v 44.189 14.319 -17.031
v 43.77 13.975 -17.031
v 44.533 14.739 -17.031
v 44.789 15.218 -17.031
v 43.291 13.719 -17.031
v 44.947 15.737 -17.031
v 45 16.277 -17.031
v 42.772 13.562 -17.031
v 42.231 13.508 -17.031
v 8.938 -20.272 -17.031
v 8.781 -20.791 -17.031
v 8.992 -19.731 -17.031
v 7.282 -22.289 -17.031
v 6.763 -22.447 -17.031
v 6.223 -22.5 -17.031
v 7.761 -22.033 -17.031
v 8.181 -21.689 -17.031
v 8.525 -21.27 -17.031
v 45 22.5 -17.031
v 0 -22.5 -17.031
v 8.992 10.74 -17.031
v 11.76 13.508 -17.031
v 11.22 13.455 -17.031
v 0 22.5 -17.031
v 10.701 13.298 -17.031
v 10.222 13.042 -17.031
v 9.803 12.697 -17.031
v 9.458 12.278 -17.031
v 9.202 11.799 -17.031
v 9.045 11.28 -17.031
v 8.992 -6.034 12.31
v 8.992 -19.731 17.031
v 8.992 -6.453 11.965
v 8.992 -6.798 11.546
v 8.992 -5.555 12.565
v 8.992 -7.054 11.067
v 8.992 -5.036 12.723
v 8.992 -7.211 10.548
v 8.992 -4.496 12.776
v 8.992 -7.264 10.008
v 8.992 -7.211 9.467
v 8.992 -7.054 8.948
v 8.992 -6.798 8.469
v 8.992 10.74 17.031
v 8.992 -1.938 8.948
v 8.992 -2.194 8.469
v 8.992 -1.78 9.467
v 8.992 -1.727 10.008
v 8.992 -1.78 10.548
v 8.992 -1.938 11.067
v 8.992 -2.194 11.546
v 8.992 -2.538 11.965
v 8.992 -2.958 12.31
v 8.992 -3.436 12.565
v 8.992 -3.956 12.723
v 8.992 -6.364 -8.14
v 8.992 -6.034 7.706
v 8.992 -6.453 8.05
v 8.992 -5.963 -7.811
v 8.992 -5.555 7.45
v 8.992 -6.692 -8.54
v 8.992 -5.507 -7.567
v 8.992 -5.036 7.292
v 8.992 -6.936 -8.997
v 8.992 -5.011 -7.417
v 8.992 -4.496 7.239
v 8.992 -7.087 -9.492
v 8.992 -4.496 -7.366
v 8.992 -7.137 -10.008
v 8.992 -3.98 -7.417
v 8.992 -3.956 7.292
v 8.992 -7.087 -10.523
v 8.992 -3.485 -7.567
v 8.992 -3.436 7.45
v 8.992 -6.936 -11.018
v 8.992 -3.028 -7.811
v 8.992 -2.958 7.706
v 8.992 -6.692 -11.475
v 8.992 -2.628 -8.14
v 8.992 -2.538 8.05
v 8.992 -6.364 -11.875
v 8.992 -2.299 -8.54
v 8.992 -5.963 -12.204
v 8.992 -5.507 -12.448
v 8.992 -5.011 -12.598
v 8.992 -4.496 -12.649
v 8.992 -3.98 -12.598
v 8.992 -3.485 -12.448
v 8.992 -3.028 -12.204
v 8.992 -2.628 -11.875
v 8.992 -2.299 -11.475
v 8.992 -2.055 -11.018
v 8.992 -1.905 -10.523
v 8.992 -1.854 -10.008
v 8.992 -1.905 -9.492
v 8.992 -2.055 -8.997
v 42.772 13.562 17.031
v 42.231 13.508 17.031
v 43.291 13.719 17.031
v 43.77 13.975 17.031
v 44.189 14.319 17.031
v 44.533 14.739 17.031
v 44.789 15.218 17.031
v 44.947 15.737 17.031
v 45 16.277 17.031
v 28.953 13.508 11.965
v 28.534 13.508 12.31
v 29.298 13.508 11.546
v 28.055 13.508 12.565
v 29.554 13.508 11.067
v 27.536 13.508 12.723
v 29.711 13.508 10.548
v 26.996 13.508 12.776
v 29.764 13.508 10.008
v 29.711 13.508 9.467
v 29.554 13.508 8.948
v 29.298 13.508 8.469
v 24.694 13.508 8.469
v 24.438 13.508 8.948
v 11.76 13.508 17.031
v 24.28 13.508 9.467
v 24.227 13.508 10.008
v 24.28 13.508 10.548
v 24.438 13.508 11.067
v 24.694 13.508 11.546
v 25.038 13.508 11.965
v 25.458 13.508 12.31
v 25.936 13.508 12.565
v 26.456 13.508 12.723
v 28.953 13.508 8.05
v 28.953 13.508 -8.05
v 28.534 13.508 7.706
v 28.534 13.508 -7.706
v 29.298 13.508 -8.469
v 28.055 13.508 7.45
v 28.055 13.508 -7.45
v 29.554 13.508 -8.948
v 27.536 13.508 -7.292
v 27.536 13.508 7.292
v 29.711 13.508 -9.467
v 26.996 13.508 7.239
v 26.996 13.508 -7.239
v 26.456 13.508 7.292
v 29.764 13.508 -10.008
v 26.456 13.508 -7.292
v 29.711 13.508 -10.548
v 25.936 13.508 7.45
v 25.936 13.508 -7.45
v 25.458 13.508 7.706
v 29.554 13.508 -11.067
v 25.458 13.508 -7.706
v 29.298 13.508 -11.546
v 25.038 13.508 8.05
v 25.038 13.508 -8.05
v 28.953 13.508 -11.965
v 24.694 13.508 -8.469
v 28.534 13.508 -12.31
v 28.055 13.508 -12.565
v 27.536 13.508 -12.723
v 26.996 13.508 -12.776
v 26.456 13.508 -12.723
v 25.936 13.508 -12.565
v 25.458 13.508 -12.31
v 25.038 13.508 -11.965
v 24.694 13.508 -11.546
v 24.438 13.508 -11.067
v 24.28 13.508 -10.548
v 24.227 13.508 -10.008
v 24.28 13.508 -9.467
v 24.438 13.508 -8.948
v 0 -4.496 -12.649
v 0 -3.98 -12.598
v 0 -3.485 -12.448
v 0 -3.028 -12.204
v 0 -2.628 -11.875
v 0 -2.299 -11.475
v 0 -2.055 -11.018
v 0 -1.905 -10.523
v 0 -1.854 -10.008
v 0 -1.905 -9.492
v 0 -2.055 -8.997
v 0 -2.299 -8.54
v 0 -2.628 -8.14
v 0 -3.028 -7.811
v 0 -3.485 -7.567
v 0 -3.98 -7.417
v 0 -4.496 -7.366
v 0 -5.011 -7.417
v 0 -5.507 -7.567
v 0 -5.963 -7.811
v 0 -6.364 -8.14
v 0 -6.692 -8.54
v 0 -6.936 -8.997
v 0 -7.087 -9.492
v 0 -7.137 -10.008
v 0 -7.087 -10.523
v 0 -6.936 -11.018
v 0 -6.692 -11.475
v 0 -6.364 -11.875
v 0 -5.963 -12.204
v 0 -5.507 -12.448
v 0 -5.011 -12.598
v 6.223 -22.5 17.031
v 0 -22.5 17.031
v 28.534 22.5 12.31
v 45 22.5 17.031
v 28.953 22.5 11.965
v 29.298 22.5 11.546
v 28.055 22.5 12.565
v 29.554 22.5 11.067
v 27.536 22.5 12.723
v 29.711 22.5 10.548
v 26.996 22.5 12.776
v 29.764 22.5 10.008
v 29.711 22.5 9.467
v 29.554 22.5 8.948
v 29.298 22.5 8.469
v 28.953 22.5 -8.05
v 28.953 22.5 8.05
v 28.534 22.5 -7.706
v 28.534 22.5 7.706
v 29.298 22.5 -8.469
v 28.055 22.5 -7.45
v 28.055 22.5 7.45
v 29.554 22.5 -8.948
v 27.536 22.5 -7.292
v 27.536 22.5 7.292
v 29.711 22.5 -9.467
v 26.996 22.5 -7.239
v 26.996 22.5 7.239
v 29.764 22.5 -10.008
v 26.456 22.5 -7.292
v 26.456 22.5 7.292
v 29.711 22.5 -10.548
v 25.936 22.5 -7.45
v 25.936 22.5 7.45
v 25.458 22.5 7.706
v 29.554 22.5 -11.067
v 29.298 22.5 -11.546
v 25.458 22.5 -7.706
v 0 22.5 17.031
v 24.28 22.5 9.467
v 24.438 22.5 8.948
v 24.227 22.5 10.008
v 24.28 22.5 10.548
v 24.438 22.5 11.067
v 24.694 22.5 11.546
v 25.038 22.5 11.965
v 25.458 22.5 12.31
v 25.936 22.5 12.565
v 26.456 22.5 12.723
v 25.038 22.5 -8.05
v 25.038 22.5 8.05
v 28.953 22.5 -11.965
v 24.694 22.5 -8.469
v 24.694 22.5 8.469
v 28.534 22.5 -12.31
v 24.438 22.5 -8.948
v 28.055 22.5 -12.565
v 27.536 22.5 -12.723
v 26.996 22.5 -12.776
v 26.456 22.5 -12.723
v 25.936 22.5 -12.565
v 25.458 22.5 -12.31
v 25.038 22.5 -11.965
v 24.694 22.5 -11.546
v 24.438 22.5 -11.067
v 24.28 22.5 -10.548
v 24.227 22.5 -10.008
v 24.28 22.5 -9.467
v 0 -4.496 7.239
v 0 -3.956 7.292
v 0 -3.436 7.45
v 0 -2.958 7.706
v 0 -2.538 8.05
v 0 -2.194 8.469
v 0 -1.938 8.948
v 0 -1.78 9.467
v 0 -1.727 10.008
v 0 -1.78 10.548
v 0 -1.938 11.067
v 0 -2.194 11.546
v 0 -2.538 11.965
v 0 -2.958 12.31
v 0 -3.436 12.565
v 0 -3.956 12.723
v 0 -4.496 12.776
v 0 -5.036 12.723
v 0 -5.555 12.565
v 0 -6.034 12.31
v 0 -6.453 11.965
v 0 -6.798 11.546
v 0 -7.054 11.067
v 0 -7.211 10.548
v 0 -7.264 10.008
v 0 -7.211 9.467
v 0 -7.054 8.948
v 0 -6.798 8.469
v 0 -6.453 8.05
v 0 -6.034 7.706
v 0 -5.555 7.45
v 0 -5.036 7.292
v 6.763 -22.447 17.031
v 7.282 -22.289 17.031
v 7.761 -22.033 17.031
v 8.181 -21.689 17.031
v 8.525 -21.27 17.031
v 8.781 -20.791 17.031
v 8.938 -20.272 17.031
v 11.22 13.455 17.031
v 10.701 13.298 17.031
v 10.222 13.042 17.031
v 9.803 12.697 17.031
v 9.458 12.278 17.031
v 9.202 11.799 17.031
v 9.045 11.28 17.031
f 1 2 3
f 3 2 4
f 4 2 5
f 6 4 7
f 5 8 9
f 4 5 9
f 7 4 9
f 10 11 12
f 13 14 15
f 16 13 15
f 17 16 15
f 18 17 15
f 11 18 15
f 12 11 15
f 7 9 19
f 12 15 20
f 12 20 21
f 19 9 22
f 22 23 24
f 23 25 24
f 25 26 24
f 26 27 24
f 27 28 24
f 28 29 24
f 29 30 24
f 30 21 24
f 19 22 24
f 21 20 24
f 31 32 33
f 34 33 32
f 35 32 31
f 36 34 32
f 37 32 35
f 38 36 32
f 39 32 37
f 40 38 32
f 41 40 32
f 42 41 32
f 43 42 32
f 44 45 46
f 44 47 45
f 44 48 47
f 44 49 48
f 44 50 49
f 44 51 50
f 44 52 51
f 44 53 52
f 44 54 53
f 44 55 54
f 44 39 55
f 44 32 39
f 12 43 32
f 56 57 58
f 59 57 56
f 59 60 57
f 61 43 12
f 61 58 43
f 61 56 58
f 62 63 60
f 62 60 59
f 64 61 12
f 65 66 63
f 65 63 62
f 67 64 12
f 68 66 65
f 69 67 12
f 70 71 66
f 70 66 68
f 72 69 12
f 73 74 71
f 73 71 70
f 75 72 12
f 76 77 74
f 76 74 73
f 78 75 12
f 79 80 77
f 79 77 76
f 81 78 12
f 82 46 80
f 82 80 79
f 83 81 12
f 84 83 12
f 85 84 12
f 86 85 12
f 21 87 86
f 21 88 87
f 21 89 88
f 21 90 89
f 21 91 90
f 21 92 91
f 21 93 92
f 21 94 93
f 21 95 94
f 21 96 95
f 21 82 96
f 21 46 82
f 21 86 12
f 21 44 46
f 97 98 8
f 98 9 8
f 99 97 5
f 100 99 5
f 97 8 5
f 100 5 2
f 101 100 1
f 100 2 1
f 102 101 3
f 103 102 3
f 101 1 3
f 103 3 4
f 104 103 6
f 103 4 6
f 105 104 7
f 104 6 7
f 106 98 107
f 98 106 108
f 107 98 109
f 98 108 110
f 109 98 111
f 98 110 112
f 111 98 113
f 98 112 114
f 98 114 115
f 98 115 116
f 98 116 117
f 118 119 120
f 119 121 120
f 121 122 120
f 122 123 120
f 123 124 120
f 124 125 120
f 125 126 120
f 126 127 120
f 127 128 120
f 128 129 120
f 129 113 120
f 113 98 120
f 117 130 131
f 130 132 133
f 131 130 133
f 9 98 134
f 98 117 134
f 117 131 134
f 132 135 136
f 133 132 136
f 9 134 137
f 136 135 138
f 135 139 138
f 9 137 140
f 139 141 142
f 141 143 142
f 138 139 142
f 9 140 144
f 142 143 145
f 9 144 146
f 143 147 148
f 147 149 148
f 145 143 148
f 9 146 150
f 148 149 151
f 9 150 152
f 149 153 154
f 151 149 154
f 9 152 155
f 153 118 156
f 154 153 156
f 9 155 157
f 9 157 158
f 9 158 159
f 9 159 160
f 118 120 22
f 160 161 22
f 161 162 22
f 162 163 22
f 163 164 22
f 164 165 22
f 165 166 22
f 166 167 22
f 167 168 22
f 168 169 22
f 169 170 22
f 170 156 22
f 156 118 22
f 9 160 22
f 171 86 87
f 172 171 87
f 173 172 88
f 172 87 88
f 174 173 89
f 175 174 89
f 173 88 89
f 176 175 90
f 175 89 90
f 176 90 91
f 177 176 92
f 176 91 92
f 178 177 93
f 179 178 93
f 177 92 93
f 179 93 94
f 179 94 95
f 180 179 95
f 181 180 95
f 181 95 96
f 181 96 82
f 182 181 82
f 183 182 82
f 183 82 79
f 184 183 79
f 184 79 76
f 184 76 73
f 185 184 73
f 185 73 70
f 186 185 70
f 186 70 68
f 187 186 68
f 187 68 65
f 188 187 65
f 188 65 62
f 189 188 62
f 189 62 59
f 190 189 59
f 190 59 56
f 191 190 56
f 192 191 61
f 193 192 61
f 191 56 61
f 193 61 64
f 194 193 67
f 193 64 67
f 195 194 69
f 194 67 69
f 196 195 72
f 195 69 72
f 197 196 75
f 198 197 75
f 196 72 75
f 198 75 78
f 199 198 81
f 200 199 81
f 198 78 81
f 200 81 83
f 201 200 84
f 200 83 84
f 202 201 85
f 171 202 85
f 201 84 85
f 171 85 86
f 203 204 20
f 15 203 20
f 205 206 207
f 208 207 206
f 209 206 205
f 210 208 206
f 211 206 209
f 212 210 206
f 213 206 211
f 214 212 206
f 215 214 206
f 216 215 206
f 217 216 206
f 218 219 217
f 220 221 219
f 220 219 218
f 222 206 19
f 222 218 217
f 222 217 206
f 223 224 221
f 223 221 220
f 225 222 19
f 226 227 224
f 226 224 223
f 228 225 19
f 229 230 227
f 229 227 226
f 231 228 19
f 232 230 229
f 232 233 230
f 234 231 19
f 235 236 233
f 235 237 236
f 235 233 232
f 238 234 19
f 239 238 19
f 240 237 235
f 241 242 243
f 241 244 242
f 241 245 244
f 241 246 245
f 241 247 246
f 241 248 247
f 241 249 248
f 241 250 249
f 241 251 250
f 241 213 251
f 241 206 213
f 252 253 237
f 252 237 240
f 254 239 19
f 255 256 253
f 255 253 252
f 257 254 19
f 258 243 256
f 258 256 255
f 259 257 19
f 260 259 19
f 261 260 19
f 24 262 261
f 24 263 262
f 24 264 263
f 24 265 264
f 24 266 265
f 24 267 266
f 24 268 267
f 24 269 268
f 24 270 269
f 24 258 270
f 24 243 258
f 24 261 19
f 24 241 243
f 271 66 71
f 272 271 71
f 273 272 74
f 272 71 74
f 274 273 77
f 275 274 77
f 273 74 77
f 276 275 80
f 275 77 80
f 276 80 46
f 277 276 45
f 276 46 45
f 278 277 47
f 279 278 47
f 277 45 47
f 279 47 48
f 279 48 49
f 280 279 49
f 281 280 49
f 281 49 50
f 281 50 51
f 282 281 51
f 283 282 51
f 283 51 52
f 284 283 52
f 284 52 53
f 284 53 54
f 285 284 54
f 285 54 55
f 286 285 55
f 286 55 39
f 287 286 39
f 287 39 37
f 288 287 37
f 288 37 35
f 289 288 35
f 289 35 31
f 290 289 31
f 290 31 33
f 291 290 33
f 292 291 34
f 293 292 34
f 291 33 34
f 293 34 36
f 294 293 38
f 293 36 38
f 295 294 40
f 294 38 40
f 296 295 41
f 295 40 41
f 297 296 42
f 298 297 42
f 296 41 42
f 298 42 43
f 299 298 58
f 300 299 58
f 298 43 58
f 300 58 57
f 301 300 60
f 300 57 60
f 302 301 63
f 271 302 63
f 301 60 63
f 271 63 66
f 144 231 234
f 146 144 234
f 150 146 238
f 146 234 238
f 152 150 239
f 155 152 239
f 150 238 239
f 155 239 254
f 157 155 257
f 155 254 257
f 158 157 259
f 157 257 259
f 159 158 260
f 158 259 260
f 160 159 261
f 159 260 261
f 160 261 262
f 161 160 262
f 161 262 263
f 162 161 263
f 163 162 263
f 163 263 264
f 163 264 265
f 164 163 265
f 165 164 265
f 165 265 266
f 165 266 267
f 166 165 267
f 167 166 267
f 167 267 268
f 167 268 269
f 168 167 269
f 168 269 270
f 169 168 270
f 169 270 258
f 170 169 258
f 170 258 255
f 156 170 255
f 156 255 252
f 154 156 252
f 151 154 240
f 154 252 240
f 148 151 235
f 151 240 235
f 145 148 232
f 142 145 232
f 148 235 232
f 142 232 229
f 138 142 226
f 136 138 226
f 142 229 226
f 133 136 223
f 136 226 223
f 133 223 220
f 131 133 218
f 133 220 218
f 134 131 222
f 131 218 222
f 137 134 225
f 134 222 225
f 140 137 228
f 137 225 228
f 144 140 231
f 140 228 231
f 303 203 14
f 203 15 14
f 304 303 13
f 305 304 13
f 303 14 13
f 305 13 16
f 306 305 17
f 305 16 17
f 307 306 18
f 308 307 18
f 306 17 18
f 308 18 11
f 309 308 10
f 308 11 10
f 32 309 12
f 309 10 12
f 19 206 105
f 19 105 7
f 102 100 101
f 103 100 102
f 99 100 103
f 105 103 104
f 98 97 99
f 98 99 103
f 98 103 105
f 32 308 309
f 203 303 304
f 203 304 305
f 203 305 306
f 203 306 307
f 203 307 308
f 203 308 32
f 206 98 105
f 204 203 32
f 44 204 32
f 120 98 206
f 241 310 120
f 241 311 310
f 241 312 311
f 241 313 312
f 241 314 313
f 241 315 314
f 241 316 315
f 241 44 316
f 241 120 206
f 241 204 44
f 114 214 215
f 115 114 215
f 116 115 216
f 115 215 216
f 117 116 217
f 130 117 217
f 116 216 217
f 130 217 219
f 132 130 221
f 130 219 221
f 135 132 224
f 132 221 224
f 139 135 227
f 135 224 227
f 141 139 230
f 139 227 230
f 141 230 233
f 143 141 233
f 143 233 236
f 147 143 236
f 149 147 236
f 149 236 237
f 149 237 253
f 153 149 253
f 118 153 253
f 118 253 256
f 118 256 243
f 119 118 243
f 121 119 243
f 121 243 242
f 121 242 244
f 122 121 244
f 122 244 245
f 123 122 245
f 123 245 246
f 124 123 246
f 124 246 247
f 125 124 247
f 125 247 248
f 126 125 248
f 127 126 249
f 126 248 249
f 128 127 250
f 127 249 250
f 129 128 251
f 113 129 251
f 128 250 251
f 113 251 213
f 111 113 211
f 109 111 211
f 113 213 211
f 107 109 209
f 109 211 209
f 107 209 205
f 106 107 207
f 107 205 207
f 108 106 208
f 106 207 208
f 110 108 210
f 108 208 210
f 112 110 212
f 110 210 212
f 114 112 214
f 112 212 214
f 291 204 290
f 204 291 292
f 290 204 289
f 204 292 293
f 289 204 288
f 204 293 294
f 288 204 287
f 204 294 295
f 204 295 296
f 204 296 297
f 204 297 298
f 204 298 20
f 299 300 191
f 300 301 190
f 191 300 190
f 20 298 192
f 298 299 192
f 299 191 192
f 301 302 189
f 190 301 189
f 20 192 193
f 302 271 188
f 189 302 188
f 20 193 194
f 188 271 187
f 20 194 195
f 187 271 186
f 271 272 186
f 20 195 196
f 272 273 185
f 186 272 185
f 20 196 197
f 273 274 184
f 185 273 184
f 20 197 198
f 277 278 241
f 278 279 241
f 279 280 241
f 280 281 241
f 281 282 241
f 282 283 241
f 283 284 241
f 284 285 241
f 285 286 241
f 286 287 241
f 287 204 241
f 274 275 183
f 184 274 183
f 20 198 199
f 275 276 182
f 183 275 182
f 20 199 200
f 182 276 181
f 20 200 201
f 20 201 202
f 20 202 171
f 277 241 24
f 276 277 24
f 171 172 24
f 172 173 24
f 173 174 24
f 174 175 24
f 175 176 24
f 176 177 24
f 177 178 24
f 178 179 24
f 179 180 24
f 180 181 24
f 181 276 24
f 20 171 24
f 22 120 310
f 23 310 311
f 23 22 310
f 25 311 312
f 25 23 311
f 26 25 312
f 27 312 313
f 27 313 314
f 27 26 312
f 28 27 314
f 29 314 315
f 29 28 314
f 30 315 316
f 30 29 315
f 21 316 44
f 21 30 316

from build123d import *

# Parameters (mm, degrees)
SKETCH1_W           = 34.0614
SKETCH1_H           = 45
BOSS_EXTRUDE1_DEPTH = 8.9916
SKETCH2_W           = 34.0614
SKETCH2_H           = 8.9916
BOSS_EXTRUDE2_DEPTH = 36.0084
CUT_EXTRUDE2_REACH  = 10.992
SKETCH5_R           = 2.7686
SKETCH5_R_2         = 2.6416
CUT_EXTRUDE3_REACH  = 47
SKETCH6_R           = 2.7686
FILLET1_R           = 2.7686


with BuildPart() as part:
    # Sketch1 → Boss-Extrude1 (new body)
    with BuildSketch(Plane(origin=(0, 0, 0), x_dir=(0, 0, -1), z_dir=(1, 0, 0))):
        Rectangle(SKETCH1_W, SKETCH1_H)
    extrude(amount=BOSS_EXTRUDE1_DEPTH)

    # Sketch2 → Boss-Extrude2 (add)
    with BuildSketch(Plane(origin=(8.9916, 0, 0), x_dir=(0, 0, -1), z_dir=(1, 0, 0))):
        with Locations((0, 18.0042)):
            Rectangle(SKETCH2_W, SKETCH2_H)
    extrude(amount=BOSS_EXTRUDE2_DEPTH)

    # Sketch5 → Cut-Extrude2 (cut, up to next)
    with BuildSketch(Plane(origin=(8.9916, 0, 0), x_dir=(0, 0, -1), z_dir=(1, 0, 0)), mode=Mode.PRIVATE) as cut_extrude2_sk1:
        with Locations((-10.0076, -4.4958)):
            Circle(SKETCH5_R)
    cut_extrude2_tool1 = extrude(cut_extrude2_sk1.sketch, amount=-CUT_EXTRUDE2_REACH, mode=Mode.PRIVATE) & part.part
    add(cut_extrude2_tool1.solids().sort_by_distance((8.9916, -4.4958, 10.0076))[0], mode=Mode.SUBTRACT)
    # Sketch5 → Cut-Extrude2 (cut, up to next)
    with BuildSketch(Plane(origin=(8.9916, 0, 0), x_dir=(0, 0, -1), z_dir=(1, 0, 0)), mode=Mode.PRIVATE) as cut_extrude2_sk2:
        with Locations((10.0076, -4.4958)):
            Circle(SKETCH5_R_2)
    cut_extrude2_tool2 = extrude(cut_extrude2_sk2.sketch, amount=-CUT_EXTRUDE2_REACH, mode=Mode.PRIVATE) & part.part
    add(cut_extrude2_tool2.solids().sort_by_distance((8.9916, -4.4958, -10.0076))[0], mode=Mode.SUBTRACT)

    # Sketch6 → Cut-Extrude3 (cut, up to next)
    with BuildSketch(Plane(origin=(0, 22.5, 0), x_dir=(1, 0, 0), z_dir=(0, 1, 0)), mode=Mode.PRIVATE) as cut_extrude3_sk1:
        with Locations((26.995718, 10.0076)):
            Circle(SKETCH6_R)
    cut_extrude3_tool1 = extrude(cut_extrude3_sk1.sketch, amount=-CUT_EXTRUDE3_REACH, mode=Mode.PRIVATE) & part.part
    add(cut_extrude3_tool1.solids().sort_by_distance((26.995718, 22.5, -10.0076))[0], mode=Mode.SUBTRACT)
    # Sketch6 → Cut-Extrude3 (cut, up to next)
    with BuildSketch(Plane(origin=(0, 22.5, 0), x_dir=(1, 0, 0), z_dir=(0, 1, 0)), mode=Mode.PRIVATE) as cut_extrude3_sk2:
        with Locations((26.995718, -10.0076)):
            Circle(SKETCH6_R)
    cut_extrude3_tool2 = extrude(cut_extrude3_sk2.sketch, amount=-CUT_EXTRUDE3_REACH, mode=Mode.PRIVATE) & part.part
    add(cut_extrude3_tool2.solids().sort_by_distance((26.995718, 22.5, 10.0076))[0], mode=Mode.SUBTRACT)

    # Fillet1
    fillet1_edges = [part.edges().sort_by_distance(p)[0] for p in [
        (8.9916, -22.5, 0),
        (8.9916, 13.5084, 0),
        (45, 13.5084, 0),
    ]]
    fillet(fillet1_edges, radius=FILLET1_R)


solid = part.part
